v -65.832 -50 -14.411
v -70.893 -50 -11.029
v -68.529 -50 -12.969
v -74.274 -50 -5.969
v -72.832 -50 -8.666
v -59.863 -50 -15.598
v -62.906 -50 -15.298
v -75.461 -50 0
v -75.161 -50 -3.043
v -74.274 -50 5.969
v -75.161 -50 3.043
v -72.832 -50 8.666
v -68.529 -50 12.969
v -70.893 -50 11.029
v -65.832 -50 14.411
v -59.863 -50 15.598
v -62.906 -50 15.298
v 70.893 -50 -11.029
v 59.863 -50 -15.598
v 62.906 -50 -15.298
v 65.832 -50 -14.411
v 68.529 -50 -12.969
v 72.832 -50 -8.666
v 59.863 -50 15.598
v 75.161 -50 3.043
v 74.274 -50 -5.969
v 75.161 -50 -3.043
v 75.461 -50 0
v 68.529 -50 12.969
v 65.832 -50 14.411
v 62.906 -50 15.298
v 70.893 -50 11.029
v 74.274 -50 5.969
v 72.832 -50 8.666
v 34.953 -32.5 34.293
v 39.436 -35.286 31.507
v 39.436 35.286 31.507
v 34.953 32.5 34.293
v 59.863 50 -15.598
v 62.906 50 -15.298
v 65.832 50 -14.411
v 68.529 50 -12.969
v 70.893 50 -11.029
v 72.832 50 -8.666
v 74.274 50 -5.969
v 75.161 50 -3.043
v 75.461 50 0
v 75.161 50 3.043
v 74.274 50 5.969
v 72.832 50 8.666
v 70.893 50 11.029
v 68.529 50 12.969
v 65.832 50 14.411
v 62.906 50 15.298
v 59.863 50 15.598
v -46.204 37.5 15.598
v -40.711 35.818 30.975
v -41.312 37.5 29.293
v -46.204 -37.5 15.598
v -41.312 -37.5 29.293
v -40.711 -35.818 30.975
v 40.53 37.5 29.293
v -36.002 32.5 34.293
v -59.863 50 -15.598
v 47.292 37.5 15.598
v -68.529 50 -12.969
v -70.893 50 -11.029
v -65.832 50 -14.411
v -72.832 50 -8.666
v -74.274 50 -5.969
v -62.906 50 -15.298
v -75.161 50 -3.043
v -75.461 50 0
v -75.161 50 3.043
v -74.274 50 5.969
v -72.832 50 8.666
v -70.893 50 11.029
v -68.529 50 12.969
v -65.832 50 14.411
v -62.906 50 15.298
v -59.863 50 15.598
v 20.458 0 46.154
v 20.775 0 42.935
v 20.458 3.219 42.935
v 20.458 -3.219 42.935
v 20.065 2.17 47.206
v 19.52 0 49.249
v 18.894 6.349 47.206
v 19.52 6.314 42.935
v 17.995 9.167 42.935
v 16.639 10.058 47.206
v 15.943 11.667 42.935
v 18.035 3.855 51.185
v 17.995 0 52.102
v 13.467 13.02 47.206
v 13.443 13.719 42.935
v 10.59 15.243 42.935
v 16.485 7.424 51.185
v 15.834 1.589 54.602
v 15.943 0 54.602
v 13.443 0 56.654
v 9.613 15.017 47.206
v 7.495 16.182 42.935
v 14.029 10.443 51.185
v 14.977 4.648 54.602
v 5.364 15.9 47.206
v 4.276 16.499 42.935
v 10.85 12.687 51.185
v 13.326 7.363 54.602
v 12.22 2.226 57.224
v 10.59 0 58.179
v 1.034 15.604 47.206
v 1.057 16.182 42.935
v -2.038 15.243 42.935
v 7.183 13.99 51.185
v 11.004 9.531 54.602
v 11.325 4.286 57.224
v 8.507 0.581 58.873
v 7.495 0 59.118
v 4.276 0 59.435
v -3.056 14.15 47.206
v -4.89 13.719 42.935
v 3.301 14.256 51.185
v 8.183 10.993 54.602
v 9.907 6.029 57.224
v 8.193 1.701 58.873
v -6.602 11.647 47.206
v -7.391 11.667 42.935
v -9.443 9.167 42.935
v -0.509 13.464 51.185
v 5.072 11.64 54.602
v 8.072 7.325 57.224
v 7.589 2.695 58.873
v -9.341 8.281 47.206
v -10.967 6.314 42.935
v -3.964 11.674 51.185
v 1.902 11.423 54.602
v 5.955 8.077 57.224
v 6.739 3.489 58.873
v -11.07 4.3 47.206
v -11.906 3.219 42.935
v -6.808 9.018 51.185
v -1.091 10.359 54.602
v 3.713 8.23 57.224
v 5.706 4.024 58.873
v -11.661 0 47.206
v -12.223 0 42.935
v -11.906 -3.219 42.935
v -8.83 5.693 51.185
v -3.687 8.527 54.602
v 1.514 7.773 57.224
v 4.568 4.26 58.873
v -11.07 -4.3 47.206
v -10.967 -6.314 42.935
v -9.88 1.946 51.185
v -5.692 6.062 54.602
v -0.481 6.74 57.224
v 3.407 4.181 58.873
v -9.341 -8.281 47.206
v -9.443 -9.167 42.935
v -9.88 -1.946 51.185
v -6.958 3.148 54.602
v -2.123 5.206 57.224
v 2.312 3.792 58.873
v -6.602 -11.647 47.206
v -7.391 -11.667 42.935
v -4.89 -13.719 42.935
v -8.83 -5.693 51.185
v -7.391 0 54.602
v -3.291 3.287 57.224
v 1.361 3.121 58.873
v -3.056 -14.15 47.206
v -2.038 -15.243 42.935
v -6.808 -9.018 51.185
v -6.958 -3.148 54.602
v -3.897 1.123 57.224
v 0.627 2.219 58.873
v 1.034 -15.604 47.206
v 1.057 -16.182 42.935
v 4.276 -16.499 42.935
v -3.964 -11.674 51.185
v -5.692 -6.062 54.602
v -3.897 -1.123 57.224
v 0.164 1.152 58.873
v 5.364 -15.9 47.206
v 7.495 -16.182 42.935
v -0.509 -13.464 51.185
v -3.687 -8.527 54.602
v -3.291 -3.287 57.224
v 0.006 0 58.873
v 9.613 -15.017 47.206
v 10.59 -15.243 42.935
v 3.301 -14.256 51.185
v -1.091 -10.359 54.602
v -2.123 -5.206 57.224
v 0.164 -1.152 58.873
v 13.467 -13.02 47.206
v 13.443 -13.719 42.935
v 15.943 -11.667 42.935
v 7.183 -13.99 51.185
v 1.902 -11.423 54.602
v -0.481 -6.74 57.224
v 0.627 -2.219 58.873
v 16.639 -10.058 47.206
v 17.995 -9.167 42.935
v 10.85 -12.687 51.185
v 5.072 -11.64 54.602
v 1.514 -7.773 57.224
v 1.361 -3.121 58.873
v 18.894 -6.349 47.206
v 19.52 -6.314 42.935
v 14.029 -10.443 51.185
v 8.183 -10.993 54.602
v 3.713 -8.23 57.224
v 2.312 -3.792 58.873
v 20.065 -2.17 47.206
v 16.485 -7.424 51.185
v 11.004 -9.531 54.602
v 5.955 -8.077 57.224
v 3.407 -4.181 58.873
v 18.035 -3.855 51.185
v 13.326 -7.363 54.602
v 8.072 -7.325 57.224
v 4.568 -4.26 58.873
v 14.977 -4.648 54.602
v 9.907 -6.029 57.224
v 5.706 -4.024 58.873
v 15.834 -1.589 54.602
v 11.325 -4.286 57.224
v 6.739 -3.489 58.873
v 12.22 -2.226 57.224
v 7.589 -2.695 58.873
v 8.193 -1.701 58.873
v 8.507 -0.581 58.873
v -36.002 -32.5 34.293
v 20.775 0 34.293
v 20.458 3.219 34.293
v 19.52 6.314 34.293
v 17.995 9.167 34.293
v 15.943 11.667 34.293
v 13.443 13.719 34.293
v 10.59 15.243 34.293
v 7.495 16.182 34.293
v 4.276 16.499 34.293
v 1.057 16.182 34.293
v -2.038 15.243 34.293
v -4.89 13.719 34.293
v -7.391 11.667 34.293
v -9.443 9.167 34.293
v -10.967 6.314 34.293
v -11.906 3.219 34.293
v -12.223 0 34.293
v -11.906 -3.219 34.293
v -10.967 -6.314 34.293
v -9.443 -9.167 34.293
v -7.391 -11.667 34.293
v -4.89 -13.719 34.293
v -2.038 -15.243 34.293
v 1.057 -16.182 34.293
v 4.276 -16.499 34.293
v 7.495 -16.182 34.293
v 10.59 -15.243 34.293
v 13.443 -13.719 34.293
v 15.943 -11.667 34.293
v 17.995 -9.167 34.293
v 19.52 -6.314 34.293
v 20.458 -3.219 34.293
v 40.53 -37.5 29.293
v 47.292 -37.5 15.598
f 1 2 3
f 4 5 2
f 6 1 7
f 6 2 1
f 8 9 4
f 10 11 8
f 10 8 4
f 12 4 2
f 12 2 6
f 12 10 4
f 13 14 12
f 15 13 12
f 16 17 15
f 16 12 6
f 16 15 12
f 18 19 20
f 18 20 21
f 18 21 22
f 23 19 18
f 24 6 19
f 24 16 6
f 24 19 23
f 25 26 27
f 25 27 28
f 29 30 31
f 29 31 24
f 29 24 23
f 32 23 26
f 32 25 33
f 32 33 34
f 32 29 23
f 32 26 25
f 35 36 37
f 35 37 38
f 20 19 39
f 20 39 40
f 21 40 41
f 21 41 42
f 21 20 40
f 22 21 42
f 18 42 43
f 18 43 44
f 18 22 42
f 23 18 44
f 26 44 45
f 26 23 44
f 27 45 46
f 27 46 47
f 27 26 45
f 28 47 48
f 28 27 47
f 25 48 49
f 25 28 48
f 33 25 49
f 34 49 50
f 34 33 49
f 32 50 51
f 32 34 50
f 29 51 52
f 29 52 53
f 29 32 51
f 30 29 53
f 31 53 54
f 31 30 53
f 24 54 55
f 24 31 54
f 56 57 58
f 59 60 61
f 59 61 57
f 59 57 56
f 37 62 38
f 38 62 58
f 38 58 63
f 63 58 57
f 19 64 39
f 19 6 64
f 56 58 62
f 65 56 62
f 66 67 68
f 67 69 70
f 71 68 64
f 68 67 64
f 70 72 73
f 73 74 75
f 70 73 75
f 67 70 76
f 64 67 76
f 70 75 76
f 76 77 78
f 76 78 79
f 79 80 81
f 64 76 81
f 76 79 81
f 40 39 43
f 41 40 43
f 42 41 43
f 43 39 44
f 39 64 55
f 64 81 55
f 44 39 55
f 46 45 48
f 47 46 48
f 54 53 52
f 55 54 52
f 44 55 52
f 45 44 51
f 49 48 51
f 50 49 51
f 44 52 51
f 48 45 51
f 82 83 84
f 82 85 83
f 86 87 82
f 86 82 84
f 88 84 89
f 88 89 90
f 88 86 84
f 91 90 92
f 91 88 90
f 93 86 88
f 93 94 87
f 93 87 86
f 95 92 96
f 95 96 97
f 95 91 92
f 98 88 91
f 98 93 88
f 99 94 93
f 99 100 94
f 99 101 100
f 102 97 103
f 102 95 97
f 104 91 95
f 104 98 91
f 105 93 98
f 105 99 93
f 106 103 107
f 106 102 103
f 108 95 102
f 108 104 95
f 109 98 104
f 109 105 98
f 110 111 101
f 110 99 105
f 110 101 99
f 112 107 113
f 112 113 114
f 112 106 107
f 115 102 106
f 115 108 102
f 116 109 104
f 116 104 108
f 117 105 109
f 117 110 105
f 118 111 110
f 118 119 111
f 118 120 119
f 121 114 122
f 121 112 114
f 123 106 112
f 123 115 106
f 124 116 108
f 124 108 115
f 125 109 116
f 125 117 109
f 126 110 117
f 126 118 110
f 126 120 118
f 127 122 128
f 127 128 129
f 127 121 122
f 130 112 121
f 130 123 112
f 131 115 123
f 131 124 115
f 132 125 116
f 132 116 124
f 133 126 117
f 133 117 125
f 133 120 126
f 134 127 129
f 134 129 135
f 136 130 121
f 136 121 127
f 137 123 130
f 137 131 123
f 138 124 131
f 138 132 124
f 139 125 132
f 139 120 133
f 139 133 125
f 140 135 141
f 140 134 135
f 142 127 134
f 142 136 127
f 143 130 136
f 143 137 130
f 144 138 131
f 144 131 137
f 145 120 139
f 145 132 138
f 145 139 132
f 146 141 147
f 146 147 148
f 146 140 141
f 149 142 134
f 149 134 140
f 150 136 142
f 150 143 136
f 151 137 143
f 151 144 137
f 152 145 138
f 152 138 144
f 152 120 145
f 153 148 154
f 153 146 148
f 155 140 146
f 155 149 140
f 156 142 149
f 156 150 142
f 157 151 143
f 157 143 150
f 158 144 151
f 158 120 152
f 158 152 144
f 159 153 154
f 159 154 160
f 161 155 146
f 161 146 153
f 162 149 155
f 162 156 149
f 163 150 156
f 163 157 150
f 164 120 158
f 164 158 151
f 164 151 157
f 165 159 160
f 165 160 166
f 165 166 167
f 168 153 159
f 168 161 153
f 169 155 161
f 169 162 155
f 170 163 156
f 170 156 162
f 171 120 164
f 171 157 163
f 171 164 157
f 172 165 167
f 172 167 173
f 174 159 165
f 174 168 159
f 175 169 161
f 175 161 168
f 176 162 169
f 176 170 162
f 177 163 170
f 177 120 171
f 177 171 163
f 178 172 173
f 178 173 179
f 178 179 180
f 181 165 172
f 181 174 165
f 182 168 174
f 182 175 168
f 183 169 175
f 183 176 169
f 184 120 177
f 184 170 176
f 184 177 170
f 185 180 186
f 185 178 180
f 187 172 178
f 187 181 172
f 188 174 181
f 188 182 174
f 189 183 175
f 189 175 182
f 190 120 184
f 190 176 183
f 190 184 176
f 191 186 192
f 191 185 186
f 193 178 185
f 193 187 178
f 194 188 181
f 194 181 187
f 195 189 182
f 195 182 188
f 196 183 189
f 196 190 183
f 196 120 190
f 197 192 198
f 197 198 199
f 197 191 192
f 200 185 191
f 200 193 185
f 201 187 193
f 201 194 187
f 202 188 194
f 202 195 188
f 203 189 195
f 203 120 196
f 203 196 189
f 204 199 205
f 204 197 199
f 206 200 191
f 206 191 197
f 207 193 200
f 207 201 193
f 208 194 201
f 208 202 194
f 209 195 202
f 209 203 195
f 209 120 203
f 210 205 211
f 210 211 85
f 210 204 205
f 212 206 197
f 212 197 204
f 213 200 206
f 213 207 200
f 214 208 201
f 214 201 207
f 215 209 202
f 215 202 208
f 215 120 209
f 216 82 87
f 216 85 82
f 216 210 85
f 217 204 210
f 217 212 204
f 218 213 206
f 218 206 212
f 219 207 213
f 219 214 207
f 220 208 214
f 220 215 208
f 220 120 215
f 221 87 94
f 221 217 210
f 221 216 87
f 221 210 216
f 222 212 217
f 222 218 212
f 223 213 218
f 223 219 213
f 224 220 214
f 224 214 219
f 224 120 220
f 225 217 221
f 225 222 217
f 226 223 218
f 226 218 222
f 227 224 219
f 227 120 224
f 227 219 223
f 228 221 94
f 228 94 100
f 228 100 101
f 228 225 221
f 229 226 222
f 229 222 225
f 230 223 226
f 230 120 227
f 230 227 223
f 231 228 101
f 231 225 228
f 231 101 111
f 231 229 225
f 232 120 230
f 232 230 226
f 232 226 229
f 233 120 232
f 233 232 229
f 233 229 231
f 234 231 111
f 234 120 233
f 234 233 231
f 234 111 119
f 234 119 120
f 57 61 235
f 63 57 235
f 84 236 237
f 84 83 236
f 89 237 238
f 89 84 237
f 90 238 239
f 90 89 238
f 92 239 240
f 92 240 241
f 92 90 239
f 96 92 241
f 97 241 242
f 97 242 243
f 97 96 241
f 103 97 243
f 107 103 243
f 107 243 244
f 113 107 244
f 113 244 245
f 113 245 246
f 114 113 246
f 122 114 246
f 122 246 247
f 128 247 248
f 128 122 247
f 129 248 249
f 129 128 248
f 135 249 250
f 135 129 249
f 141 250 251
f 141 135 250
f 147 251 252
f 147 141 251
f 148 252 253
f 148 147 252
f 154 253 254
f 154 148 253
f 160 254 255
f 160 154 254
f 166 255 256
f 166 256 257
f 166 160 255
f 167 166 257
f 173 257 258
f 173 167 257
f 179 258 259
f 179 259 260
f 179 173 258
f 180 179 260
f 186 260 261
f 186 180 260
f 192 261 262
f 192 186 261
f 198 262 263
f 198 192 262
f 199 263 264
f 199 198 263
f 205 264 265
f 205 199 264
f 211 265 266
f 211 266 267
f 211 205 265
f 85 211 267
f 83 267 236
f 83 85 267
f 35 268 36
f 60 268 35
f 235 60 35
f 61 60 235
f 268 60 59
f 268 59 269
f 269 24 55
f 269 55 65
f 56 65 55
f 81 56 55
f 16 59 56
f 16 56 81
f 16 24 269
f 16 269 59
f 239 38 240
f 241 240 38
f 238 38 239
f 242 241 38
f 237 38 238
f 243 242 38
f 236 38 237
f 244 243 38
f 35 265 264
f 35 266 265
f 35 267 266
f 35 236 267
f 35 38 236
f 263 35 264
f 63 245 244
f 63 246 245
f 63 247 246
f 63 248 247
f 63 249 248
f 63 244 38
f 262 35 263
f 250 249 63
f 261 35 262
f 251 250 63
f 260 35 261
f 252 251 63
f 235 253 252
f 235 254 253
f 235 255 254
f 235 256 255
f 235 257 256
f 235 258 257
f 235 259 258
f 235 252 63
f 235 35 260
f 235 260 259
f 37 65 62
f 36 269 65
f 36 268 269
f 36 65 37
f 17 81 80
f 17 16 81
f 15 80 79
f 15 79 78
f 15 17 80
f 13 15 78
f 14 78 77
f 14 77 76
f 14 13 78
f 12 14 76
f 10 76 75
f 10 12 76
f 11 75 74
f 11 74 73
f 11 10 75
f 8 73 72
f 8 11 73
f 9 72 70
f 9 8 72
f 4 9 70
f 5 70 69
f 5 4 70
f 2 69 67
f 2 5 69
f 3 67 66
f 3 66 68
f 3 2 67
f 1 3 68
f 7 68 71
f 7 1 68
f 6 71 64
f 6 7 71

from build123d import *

# Parameters (mm, degrees)
F1_DEPTH    = 50
F2_DEPTH    = 37.5
F4_T1_DEPTH = 103.3030187921
F4_T3_DEPTH = 91.394543157
F4_T5_DEPTH = 93.4430330881


# Not quite as in the source:
# - a fillet or chamfer that OpenCascade refuses, or shapes differently, is made with other operations: its cross-section is extruded or revolved along the edge and cut away or added


with BuildPart() as f1:
    # F0 (on Front) → F1 (new body, symmetric)
    with BuildSketch(Plane.XZ):
        with BuildLine():
            Line((-59.8632097244, -15.5979888514), (59.8632097244, -15.5979888514))
            ThreePointArc((59.8632097244, -15.5979888514), (75.4611985758, 0), (59.8632097244, 15.5979888514))
            Line((59.8632097244, 15.5979888514), (47.2922846675, 15.5979888514))
            Line((47.2922846675, 15.5979888514), (-46.2039783597, 15.5979888514))
            Line((-46.2039783597, 15.5979888514), (-59.8632097244, 15.5979888514))
            ThreePointArc((-59.8632097244, 15.5979888514), (-75.4611985758, 0), (-59.8632097244, -15.5979888514))
        make_face()
    extrude(amount=F1_DEPTH, both=True)

    # F0 (on Front) → F2 (join, symmetric)
    with BuildSketch(Plane.XZ):
        Polygon((-46.2039783597, 15.5979888514), (47.2922846675, 15.5979888514), (38.0605123937, 34.2928767204), (20.7754876465, 34.2928767204), (4.2761466466, 34.2928767204), (-12.2231943533, 34.2928767204), (-39.5256765187, 34.2928767204), align=None)
    extrude(amount=F2_DEPTH, both=True)

    # F0 (on Front) → F3 (revolve)
    with BuildSketch(Plane.XZ):
        with BuildLine():
            Line((4.2761466466, 34.2928767204), (20.7754876465, 34.2928767204))
            Line((20.7754876465, 34.2928767204), (20.7754876465, 42.9353863001))
            ThreePointArc((20.7754876465, 42.9353863001), (15.9429425527, 54.6021822062), (4.2761466466, 59.4347273))
            Line((4.2761466466, 59.4347273), (4.2761466466, 42.9353863001))
            Line((4.2761466466, 42.9353863001), (4.2761466466, 34.2928767204))
        make_face()
    revolve(axis=Axis((4.2761466466, 0, 51.1850568), (0, 0, 1)))

    # F4: chamfer of 5 on 4 edges, made by hand

    # F4_s2 → F4_t1 (cut)
    with BuildSketch(Plane.YZ.offset(-52.3840914585)):
        Polygon((-37.5, 29.2928767204), (-32.5, 34.2928767204), (-37.5, 34.2928767204), align=None)
        Polygon((37.5, 29.2928767204), (32.5, 34.2928767204), (37.5, 34.2928767204), align=None)
    extrude(amount=F4_T1_DEPTH, mode=Mode.SUBTRACT)

    # F4_s4 → F4_t3 (cut)
    with BuildSketch(Plane.XZ.offset(-45.6972715785)):
        Polygon((39.4363488807, 31.506726013), (34.9531724053, 34.2928767204), (38.0605123937, 34.2928767204), align=None)
    extrude(amount=F4_T3_DEPTH, mode=Mode.SUBTRACT)

    # F4_s6 → F4_t5 (cut)
    with BuildSketch(Plane.XZ.offset(-46.7215165441)):
        Polygon((-40.7109421413, 30.9749063085), (-36.0023567418, 34.2928767204), (-39.5256765187, 34.2928767204), align=None)
    extrude(amount=F4_T5_DEPTH, mode=Mode.SUBTRACT)


solid = f1.part
